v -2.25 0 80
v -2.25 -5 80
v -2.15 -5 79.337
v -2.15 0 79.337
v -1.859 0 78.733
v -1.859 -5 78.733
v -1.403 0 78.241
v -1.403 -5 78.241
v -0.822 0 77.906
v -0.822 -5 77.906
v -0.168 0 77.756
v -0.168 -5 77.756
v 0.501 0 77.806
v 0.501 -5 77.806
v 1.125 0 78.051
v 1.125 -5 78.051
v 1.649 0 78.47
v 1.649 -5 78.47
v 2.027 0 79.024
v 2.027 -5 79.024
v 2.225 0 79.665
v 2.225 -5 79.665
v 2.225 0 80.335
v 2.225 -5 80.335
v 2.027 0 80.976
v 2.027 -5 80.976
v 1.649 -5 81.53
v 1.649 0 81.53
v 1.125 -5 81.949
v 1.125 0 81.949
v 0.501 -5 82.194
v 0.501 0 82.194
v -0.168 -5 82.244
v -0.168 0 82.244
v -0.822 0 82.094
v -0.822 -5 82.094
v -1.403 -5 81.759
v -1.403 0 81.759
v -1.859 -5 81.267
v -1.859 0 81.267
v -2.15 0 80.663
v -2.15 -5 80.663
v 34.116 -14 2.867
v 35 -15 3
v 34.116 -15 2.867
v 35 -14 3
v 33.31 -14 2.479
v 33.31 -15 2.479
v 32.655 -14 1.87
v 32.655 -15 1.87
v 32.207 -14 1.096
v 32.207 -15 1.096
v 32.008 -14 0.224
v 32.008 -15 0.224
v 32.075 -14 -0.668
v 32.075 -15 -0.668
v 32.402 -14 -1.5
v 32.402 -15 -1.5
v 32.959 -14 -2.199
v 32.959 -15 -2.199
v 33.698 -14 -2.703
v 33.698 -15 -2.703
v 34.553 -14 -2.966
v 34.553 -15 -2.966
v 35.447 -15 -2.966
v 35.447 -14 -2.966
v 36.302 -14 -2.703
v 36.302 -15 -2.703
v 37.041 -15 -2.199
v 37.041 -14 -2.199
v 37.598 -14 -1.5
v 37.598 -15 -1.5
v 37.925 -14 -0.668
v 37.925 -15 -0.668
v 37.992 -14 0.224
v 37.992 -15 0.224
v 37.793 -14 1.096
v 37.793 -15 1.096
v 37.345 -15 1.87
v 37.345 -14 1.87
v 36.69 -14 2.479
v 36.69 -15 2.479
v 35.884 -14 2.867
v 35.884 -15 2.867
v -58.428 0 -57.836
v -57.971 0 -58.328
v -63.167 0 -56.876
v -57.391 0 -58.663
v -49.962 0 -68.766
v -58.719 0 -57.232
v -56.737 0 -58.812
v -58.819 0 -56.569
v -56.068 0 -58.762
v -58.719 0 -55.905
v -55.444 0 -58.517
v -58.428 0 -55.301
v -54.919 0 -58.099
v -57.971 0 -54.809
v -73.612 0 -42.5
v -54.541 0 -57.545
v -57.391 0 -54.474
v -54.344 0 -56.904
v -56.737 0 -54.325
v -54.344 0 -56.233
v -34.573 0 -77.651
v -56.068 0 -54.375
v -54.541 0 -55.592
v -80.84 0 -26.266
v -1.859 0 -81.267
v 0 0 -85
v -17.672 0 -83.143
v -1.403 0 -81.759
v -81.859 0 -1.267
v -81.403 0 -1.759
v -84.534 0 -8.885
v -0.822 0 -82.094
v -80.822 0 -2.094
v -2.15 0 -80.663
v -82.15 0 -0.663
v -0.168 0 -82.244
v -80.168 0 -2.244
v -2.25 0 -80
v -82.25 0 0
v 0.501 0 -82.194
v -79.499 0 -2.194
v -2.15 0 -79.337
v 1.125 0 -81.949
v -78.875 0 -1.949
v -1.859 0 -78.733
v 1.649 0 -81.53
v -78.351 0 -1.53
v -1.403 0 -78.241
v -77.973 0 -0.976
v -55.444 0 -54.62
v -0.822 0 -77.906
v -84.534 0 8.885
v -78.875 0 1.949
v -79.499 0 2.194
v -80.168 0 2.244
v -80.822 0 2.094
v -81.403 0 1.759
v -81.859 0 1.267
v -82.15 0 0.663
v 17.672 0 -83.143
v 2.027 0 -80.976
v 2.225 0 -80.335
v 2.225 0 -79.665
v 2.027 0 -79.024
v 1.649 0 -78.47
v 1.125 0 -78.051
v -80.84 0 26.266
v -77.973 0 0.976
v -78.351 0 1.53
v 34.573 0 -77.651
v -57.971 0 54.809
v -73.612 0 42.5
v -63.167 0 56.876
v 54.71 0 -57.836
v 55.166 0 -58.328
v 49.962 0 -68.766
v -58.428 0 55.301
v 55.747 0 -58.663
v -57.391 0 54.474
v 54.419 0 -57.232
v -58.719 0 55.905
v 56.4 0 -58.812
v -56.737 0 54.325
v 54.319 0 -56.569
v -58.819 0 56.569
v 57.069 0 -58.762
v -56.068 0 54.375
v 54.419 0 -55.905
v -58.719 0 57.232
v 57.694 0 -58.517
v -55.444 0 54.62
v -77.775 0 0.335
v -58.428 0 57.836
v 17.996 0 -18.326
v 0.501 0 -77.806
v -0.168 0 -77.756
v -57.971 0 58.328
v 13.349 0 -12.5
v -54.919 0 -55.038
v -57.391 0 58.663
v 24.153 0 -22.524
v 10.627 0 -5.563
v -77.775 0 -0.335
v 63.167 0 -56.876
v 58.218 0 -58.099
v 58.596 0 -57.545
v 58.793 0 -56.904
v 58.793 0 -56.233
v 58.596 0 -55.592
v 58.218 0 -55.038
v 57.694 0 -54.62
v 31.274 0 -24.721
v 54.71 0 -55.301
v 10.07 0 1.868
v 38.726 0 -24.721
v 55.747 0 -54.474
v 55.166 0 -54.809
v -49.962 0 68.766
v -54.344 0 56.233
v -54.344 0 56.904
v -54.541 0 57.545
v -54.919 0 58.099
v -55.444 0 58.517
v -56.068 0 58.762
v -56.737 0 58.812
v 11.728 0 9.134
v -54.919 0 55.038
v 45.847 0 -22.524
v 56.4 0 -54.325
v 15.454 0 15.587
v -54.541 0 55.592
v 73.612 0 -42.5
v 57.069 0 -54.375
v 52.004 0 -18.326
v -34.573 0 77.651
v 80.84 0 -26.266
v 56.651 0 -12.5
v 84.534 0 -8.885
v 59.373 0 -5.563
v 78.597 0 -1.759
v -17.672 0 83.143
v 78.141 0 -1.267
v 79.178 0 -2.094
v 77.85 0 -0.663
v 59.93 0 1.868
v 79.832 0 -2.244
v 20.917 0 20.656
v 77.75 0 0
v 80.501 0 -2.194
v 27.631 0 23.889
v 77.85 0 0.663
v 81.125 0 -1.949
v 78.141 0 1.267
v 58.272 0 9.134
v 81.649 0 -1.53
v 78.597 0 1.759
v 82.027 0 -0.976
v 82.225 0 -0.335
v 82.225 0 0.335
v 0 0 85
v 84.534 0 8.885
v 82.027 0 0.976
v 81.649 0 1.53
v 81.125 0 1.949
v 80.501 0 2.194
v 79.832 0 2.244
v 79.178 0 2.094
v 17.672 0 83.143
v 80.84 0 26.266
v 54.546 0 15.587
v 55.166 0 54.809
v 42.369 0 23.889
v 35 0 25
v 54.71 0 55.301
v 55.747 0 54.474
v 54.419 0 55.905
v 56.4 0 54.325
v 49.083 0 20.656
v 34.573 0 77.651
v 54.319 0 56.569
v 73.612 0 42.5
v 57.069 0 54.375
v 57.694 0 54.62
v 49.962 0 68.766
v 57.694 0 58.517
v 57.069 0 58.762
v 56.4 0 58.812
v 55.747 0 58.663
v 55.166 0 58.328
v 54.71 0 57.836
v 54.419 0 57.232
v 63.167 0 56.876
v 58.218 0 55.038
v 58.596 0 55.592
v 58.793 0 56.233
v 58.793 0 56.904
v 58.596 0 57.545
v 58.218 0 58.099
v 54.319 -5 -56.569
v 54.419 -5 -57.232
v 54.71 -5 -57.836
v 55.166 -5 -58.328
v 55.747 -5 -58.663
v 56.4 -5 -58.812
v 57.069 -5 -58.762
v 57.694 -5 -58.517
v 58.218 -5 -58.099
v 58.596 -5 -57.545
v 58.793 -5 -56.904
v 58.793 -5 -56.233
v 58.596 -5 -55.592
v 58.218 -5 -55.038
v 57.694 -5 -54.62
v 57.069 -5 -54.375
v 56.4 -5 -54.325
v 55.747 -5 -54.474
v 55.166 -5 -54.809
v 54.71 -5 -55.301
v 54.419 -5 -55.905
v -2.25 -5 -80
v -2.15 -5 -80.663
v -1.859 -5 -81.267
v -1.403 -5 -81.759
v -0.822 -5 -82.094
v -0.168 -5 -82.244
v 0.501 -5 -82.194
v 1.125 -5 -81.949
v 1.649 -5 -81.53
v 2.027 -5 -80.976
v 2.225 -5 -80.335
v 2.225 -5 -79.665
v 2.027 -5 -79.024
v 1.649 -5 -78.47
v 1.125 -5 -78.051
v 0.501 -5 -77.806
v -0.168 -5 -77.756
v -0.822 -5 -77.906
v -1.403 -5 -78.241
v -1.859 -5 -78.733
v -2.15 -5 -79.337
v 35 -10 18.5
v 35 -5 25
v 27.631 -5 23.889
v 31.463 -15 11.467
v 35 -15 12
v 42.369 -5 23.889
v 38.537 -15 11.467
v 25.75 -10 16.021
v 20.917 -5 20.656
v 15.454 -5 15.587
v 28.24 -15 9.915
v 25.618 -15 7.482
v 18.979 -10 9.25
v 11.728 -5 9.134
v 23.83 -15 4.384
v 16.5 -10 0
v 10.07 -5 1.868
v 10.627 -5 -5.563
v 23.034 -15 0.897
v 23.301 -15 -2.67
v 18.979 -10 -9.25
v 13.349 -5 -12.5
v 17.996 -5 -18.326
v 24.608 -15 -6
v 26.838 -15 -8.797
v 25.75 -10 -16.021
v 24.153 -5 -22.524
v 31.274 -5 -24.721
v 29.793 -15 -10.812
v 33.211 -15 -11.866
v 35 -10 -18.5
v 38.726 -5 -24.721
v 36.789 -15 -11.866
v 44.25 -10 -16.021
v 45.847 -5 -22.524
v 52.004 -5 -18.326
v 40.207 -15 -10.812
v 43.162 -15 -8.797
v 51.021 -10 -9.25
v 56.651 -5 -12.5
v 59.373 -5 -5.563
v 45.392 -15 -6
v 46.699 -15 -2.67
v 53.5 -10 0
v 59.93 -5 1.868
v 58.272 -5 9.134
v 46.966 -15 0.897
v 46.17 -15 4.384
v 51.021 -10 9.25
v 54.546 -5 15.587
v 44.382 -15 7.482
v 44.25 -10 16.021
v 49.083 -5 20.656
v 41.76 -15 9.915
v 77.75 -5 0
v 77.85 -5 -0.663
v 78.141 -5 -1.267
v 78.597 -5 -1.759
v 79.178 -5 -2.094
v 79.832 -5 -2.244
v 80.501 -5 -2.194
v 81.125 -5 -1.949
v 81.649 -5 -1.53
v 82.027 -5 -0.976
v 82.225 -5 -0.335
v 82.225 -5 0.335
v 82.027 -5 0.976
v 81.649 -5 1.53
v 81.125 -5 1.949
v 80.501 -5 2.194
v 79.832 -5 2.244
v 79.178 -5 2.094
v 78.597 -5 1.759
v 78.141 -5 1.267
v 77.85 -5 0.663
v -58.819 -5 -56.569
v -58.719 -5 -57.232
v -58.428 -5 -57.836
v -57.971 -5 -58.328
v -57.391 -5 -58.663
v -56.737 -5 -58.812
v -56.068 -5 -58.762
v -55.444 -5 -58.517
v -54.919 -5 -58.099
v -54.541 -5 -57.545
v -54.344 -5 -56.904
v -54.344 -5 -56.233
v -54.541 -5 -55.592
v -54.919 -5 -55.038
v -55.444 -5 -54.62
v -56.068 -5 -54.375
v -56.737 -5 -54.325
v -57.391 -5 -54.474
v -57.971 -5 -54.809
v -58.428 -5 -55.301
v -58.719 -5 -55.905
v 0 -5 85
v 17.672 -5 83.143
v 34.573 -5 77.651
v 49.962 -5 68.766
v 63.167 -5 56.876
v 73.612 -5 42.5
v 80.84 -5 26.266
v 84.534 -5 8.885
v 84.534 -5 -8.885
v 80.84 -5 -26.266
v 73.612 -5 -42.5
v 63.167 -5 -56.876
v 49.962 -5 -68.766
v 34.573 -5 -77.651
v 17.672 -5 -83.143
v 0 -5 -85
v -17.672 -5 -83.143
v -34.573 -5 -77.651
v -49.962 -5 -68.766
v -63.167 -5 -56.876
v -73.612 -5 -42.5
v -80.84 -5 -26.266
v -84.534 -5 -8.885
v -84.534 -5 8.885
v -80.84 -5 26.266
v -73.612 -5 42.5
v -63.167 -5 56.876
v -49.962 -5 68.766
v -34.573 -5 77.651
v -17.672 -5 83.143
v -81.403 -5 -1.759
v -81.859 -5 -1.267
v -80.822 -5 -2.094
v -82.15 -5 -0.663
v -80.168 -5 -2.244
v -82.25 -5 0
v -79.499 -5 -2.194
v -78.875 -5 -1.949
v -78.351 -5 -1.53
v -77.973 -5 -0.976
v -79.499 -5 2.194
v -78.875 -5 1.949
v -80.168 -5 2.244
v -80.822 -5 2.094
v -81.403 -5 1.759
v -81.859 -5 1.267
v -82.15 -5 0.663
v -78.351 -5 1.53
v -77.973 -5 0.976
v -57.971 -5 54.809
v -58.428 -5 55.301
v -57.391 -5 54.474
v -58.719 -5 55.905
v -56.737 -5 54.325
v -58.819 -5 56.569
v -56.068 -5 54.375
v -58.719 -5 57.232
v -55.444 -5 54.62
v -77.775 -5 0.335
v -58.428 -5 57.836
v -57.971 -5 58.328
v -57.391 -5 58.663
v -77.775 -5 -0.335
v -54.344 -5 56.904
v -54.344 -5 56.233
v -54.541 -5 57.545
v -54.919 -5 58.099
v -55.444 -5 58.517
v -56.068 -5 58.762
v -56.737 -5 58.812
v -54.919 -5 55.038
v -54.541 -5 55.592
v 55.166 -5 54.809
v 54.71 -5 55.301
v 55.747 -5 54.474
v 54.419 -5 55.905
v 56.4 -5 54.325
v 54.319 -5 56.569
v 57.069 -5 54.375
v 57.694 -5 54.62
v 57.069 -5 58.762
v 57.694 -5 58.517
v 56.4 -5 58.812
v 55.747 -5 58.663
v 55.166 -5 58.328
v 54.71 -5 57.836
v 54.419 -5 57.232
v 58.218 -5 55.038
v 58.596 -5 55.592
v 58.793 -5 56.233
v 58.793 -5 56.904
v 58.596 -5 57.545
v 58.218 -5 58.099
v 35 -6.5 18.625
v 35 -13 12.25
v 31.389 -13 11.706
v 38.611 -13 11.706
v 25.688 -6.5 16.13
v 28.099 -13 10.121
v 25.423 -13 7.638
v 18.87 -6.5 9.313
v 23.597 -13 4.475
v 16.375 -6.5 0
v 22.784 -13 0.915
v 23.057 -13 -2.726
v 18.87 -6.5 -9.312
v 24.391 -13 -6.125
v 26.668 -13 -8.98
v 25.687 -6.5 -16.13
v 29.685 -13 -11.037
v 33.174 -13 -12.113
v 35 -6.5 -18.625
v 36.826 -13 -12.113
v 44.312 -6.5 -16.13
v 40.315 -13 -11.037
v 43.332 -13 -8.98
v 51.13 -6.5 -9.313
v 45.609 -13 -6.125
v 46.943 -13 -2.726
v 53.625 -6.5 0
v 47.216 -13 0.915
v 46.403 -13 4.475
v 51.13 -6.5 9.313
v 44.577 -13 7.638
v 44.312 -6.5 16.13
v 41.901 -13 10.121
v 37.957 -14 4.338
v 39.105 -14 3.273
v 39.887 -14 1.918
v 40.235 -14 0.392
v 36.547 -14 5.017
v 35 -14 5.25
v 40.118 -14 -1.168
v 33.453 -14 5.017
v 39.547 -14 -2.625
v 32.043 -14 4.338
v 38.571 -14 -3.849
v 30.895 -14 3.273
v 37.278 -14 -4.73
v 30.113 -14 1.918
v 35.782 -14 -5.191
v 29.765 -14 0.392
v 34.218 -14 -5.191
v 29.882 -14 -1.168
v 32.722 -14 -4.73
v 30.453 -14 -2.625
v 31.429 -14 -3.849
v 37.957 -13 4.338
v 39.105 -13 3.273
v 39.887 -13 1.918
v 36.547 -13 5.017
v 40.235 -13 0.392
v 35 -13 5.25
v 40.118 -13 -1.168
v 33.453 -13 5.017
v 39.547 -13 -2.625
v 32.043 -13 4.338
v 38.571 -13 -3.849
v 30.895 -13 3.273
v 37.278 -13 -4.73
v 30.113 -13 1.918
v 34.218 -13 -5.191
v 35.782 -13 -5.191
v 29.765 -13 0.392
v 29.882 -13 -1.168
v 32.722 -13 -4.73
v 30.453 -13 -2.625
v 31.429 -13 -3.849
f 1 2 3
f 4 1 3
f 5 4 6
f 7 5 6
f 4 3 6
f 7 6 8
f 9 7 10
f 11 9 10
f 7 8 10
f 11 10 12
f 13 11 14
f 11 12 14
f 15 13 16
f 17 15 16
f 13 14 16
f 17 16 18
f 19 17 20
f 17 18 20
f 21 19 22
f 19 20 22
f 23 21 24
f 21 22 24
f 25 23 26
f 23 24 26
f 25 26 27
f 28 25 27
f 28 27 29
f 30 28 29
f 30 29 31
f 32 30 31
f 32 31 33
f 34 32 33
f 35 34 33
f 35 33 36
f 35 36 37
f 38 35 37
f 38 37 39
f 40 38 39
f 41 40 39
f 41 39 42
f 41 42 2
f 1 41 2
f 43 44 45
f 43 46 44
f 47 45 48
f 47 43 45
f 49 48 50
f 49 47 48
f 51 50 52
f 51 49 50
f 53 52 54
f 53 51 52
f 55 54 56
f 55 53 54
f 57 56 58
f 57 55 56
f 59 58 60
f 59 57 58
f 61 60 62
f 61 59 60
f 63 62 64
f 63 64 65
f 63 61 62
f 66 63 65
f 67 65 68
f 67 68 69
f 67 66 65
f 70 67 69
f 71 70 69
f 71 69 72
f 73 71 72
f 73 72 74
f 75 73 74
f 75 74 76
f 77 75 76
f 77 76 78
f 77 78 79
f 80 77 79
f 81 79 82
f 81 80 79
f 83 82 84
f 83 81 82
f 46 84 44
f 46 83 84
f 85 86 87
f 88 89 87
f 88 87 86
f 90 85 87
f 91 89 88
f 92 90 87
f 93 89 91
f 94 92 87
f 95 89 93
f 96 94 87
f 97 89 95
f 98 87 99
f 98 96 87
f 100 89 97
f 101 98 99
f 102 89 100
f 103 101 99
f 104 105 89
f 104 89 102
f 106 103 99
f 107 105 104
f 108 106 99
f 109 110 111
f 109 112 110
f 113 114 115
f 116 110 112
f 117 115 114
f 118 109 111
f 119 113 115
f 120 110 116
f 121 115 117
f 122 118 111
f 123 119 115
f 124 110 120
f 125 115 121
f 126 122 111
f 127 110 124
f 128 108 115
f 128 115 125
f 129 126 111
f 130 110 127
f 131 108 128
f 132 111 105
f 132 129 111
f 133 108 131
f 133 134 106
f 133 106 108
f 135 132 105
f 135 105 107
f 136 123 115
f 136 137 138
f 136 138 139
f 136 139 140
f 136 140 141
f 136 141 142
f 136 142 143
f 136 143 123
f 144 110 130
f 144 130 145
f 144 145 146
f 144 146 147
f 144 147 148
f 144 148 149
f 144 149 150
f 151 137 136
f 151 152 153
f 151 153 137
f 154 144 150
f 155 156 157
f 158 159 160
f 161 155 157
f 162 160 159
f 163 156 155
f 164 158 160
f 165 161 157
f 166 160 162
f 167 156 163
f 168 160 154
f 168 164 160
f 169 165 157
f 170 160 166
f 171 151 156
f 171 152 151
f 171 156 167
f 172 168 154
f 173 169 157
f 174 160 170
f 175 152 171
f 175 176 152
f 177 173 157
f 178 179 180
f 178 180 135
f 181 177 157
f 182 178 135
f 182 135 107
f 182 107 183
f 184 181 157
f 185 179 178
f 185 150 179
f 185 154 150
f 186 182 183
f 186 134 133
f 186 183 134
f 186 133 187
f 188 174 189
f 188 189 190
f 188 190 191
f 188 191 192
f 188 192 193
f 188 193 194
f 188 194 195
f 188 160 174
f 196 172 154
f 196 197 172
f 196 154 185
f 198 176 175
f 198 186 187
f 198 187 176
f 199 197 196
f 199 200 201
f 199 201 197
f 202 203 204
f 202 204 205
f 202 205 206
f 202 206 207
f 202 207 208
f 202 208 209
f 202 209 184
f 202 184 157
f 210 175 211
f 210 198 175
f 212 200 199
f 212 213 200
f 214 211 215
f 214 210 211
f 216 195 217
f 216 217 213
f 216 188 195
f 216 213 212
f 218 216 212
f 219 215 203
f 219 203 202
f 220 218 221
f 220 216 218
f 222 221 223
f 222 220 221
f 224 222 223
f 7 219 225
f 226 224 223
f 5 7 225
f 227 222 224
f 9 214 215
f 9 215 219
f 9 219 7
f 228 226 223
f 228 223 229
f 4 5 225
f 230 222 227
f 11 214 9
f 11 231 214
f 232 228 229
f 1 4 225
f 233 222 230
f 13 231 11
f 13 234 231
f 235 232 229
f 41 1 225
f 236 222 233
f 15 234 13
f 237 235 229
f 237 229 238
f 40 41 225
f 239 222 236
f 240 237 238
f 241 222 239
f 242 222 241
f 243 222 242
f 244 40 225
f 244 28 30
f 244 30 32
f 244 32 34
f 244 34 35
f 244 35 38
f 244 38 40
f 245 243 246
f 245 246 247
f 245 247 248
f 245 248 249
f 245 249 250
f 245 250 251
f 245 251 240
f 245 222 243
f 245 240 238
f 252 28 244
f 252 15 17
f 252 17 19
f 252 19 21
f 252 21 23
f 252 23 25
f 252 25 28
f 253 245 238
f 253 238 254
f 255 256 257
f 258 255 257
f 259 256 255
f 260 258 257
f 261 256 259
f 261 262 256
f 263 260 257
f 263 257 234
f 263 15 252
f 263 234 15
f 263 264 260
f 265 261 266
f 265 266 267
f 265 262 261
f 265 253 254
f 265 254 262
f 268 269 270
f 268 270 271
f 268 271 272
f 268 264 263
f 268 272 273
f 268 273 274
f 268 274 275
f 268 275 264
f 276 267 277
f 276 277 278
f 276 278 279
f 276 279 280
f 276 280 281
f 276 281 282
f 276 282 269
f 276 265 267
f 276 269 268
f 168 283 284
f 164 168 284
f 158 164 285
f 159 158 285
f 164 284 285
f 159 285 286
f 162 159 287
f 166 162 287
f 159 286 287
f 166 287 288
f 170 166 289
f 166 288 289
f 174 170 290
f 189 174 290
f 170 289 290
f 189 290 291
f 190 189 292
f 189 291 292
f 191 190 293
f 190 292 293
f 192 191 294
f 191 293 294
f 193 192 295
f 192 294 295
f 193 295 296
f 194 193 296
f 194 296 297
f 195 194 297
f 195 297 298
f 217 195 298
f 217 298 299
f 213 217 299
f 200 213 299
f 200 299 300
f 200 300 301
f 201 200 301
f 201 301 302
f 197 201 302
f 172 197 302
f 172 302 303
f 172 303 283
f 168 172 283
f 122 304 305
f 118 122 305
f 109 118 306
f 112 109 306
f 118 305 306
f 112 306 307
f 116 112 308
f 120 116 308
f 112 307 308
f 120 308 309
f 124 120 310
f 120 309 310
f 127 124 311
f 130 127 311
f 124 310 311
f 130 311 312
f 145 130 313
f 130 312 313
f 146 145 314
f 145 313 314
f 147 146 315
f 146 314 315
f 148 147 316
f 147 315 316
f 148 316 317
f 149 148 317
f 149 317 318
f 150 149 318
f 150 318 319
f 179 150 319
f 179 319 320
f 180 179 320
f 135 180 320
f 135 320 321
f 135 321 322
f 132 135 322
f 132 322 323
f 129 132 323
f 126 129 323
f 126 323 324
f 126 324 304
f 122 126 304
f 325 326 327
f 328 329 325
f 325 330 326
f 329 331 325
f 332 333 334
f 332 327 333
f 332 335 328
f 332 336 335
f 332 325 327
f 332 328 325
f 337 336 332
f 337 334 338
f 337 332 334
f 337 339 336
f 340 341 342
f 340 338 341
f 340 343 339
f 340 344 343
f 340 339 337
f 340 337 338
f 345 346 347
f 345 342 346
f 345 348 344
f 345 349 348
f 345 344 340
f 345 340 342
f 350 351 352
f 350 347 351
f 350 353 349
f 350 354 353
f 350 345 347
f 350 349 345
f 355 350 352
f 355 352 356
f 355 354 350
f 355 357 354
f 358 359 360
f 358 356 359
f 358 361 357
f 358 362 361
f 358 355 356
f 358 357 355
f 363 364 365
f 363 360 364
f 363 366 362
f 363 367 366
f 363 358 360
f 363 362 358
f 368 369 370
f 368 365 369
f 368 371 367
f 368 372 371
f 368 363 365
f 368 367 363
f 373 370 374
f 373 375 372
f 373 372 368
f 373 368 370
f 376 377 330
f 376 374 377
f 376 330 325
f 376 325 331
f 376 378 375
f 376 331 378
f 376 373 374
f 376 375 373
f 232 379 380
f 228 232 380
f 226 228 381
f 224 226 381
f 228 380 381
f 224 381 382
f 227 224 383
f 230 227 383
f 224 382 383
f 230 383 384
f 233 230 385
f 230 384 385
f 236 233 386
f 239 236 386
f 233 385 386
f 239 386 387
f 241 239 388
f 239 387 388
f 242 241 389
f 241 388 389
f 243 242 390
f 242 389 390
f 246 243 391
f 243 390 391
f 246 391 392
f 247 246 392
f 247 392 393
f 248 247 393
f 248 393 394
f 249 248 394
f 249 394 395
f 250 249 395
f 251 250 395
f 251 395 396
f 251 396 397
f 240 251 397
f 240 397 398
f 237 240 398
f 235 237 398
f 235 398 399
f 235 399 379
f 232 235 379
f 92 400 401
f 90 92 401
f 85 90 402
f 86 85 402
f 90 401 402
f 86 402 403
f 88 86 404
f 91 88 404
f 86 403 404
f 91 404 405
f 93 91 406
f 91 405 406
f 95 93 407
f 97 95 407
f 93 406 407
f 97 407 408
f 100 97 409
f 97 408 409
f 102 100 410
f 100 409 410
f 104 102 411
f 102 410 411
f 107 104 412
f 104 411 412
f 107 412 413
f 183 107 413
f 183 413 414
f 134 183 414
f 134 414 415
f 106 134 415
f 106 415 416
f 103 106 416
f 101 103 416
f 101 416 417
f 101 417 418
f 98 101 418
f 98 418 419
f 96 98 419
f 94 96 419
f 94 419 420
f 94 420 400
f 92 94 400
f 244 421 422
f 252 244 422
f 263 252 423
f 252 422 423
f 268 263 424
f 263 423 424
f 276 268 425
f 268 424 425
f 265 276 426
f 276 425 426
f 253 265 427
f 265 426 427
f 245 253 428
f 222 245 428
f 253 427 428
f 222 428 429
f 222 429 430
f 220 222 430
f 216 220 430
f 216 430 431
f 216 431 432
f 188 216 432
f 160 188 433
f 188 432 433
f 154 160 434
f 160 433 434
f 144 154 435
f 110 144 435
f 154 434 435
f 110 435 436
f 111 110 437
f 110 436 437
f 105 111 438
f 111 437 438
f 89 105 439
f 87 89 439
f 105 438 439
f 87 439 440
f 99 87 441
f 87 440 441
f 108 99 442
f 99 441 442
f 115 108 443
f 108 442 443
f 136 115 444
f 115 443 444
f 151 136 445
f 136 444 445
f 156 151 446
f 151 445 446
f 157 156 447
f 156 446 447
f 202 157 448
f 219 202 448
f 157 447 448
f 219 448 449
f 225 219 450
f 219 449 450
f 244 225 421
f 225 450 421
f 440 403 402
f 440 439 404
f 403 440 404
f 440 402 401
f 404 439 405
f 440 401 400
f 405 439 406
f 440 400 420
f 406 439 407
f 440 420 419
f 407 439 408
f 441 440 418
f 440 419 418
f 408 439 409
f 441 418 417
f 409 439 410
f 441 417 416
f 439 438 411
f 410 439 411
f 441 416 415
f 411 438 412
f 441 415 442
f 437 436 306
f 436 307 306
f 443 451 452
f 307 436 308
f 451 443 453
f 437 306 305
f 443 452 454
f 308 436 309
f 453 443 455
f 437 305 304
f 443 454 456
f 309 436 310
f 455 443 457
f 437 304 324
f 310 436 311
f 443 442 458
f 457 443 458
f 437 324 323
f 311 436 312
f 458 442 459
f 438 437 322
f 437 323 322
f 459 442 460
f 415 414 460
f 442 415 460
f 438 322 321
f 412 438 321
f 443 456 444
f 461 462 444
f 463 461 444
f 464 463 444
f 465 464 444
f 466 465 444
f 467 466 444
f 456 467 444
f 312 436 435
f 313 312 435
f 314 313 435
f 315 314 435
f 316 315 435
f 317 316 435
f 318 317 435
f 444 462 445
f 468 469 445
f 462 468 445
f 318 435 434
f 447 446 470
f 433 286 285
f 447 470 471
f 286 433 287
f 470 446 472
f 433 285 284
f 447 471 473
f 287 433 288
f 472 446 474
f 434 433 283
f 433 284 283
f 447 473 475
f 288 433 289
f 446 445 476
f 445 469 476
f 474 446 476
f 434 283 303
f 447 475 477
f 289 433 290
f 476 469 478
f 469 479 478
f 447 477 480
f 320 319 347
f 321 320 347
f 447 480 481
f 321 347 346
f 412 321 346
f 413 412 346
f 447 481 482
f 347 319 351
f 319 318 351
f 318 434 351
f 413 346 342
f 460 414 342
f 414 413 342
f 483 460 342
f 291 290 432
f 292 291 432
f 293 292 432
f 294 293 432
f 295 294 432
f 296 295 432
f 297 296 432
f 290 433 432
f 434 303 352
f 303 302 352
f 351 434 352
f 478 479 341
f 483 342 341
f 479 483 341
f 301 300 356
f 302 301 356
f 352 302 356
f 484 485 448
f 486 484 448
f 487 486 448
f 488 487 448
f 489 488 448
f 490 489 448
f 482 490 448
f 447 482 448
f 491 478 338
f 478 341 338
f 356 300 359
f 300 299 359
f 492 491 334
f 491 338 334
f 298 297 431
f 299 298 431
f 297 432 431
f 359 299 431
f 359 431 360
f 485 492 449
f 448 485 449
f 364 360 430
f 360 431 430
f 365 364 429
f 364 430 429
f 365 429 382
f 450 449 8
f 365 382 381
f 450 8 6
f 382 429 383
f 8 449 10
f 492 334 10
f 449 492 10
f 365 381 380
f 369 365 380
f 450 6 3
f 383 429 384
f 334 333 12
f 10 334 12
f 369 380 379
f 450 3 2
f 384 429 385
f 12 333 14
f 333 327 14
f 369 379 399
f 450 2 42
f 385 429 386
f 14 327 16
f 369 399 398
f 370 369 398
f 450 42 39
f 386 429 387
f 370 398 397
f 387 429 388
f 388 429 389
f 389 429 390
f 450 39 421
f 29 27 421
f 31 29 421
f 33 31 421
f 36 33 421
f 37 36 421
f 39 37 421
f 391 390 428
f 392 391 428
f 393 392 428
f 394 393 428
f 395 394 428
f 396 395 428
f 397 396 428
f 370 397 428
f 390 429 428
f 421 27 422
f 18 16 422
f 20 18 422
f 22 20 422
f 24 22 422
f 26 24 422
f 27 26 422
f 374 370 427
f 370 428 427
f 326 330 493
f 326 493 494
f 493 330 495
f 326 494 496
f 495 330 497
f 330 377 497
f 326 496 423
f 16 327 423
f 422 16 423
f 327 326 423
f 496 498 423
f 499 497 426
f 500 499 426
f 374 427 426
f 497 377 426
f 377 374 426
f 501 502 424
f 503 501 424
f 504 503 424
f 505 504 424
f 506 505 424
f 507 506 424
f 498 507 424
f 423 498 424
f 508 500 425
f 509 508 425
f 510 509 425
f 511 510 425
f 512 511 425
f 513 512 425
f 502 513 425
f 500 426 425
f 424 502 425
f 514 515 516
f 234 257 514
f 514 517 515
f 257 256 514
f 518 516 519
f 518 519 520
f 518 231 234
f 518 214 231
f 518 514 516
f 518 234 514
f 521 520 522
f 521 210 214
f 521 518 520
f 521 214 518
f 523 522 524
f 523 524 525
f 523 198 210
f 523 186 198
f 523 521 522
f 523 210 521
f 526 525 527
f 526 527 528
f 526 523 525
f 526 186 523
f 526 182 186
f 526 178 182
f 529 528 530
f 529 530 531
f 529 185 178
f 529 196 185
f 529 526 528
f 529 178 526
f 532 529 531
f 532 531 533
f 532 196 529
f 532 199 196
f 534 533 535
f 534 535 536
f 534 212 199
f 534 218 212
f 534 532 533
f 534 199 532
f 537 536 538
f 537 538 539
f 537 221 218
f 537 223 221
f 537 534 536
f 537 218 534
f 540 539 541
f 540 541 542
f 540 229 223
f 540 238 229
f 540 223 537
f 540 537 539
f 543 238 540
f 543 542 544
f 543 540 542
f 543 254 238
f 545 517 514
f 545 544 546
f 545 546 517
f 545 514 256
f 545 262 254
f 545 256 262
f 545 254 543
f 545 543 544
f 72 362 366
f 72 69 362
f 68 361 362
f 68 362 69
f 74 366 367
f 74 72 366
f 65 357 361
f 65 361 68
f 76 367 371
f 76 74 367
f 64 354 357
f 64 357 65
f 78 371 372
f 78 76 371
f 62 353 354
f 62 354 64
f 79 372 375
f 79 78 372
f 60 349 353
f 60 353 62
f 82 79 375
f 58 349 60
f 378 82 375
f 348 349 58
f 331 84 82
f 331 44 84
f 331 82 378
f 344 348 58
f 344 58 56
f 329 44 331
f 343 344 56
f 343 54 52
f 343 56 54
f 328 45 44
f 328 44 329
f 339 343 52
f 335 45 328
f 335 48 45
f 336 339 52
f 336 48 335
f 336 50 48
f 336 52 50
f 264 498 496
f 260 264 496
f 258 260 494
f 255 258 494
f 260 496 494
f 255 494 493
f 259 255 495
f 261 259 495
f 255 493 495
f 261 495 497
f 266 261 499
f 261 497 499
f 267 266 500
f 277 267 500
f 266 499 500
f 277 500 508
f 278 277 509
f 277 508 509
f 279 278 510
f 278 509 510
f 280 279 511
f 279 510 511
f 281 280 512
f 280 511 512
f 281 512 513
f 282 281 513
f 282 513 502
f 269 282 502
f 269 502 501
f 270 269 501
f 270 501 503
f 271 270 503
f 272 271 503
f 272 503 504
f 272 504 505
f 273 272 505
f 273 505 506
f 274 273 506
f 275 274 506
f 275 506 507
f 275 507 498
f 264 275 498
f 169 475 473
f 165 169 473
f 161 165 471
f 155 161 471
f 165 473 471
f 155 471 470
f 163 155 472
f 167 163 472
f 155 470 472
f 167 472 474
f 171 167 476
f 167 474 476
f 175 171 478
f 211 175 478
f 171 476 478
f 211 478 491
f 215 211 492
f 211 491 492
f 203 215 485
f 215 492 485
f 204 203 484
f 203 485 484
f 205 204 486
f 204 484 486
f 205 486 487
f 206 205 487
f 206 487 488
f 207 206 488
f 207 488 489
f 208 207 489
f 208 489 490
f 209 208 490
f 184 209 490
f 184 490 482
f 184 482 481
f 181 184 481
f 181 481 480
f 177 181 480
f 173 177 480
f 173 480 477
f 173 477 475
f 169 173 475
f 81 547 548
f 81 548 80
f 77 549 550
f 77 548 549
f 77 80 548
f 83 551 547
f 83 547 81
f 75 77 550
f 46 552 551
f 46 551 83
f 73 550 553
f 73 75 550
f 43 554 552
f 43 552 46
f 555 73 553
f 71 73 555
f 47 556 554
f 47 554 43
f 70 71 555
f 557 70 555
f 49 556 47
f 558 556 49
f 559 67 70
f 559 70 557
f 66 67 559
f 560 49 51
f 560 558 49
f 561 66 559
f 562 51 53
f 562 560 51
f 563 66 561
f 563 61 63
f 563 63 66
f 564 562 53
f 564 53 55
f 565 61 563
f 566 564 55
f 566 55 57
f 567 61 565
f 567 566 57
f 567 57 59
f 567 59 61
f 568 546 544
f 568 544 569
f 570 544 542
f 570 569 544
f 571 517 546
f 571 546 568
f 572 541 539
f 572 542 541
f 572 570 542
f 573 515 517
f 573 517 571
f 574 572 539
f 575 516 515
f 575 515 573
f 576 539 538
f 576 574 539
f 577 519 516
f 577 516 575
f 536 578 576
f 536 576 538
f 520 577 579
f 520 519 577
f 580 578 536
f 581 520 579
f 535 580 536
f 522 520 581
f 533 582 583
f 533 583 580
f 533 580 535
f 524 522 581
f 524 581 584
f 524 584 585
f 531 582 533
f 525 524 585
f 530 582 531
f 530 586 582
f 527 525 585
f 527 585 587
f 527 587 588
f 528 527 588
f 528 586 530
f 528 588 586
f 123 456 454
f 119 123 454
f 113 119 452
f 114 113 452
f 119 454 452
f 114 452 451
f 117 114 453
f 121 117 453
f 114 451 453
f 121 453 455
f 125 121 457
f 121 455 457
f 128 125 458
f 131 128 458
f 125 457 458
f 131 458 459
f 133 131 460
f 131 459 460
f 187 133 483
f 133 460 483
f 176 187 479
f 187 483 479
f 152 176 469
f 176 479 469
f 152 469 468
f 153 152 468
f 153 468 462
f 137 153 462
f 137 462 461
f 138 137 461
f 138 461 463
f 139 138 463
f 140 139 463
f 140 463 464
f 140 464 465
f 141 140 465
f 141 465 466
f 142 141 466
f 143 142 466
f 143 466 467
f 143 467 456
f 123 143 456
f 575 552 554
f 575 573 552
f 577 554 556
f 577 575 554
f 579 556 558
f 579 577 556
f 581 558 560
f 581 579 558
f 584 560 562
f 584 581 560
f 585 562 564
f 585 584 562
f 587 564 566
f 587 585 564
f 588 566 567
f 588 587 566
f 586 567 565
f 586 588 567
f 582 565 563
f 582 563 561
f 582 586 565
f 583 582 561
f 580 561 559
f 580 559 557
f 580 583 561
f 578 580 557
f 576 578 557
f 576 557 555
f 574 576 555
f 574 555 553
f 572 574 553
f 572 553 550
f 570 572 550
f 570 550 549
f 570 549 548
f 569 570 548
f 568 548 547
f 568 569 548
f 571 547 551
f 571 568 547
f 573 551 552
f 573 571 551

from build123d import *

# Parameters (mm, degrees)
EXTRUDE_START      = -5
SKETCH_6_R         = 85
SKETCH_6_R_2       = 25
EXTRUDE_1041_DEPTH = 5
HOLE_WIZARD_M4_8_D = 4.5


with BuildPart() as part:
    # 草图2 → Revolve 925 (revolve)
    with BuildSketch(Plane.XY, mode=Mode.PRIVATE) as revolve_925_sk:
        Polygon((32, -15), (32, -14), (29.75, -14), (29.75, -13), (22.75, -13), (10, 0), (10, -5), (23, -15), align=None)
    revolve(revolve_925_sk.sketch.rotate(Axis((35, 1.713666668, 0), (0, -1, 0)), 270), axis=Axis((35, 1.713666668, 0), (0, -1, 0)))

    # 草图6 → Extrude 1041 (add)
    with BuildSketch(Plane(origin=(0, 0, 0), x_dir=(1, 0, 0), z_dir=(0, 1, 0)).offset(EXTRUDE_START)):
        with Locations(Location((0, 0, 0), (0, 0, 270))):
            Circle(SKETCH_6_R)
        with Locations((35, 0)):
            Circle(SKETCH_6_R_2, mode=Mode.SUBTRACT)
    extrude(amount=EXTRUDE_1041_DEPTH)

    # M4*8 固定孔 (through all)
    with Locations(Plane(origin=(0, 0, 0), x_dir=(1, 0, 0), z_dir=(0, 1, 0))):
        with Locations((80, 0), (-80, 0), (-56.568542495, 56.568542495), (0, 80), (56.568542495, -56.568542495), (0, -80), (-56.568542495, -56.568542495), (56.568542495, 56.568542495)):
            Hole(HOLE_WIZARD_M4_8_D / 2)


solid = part.part
